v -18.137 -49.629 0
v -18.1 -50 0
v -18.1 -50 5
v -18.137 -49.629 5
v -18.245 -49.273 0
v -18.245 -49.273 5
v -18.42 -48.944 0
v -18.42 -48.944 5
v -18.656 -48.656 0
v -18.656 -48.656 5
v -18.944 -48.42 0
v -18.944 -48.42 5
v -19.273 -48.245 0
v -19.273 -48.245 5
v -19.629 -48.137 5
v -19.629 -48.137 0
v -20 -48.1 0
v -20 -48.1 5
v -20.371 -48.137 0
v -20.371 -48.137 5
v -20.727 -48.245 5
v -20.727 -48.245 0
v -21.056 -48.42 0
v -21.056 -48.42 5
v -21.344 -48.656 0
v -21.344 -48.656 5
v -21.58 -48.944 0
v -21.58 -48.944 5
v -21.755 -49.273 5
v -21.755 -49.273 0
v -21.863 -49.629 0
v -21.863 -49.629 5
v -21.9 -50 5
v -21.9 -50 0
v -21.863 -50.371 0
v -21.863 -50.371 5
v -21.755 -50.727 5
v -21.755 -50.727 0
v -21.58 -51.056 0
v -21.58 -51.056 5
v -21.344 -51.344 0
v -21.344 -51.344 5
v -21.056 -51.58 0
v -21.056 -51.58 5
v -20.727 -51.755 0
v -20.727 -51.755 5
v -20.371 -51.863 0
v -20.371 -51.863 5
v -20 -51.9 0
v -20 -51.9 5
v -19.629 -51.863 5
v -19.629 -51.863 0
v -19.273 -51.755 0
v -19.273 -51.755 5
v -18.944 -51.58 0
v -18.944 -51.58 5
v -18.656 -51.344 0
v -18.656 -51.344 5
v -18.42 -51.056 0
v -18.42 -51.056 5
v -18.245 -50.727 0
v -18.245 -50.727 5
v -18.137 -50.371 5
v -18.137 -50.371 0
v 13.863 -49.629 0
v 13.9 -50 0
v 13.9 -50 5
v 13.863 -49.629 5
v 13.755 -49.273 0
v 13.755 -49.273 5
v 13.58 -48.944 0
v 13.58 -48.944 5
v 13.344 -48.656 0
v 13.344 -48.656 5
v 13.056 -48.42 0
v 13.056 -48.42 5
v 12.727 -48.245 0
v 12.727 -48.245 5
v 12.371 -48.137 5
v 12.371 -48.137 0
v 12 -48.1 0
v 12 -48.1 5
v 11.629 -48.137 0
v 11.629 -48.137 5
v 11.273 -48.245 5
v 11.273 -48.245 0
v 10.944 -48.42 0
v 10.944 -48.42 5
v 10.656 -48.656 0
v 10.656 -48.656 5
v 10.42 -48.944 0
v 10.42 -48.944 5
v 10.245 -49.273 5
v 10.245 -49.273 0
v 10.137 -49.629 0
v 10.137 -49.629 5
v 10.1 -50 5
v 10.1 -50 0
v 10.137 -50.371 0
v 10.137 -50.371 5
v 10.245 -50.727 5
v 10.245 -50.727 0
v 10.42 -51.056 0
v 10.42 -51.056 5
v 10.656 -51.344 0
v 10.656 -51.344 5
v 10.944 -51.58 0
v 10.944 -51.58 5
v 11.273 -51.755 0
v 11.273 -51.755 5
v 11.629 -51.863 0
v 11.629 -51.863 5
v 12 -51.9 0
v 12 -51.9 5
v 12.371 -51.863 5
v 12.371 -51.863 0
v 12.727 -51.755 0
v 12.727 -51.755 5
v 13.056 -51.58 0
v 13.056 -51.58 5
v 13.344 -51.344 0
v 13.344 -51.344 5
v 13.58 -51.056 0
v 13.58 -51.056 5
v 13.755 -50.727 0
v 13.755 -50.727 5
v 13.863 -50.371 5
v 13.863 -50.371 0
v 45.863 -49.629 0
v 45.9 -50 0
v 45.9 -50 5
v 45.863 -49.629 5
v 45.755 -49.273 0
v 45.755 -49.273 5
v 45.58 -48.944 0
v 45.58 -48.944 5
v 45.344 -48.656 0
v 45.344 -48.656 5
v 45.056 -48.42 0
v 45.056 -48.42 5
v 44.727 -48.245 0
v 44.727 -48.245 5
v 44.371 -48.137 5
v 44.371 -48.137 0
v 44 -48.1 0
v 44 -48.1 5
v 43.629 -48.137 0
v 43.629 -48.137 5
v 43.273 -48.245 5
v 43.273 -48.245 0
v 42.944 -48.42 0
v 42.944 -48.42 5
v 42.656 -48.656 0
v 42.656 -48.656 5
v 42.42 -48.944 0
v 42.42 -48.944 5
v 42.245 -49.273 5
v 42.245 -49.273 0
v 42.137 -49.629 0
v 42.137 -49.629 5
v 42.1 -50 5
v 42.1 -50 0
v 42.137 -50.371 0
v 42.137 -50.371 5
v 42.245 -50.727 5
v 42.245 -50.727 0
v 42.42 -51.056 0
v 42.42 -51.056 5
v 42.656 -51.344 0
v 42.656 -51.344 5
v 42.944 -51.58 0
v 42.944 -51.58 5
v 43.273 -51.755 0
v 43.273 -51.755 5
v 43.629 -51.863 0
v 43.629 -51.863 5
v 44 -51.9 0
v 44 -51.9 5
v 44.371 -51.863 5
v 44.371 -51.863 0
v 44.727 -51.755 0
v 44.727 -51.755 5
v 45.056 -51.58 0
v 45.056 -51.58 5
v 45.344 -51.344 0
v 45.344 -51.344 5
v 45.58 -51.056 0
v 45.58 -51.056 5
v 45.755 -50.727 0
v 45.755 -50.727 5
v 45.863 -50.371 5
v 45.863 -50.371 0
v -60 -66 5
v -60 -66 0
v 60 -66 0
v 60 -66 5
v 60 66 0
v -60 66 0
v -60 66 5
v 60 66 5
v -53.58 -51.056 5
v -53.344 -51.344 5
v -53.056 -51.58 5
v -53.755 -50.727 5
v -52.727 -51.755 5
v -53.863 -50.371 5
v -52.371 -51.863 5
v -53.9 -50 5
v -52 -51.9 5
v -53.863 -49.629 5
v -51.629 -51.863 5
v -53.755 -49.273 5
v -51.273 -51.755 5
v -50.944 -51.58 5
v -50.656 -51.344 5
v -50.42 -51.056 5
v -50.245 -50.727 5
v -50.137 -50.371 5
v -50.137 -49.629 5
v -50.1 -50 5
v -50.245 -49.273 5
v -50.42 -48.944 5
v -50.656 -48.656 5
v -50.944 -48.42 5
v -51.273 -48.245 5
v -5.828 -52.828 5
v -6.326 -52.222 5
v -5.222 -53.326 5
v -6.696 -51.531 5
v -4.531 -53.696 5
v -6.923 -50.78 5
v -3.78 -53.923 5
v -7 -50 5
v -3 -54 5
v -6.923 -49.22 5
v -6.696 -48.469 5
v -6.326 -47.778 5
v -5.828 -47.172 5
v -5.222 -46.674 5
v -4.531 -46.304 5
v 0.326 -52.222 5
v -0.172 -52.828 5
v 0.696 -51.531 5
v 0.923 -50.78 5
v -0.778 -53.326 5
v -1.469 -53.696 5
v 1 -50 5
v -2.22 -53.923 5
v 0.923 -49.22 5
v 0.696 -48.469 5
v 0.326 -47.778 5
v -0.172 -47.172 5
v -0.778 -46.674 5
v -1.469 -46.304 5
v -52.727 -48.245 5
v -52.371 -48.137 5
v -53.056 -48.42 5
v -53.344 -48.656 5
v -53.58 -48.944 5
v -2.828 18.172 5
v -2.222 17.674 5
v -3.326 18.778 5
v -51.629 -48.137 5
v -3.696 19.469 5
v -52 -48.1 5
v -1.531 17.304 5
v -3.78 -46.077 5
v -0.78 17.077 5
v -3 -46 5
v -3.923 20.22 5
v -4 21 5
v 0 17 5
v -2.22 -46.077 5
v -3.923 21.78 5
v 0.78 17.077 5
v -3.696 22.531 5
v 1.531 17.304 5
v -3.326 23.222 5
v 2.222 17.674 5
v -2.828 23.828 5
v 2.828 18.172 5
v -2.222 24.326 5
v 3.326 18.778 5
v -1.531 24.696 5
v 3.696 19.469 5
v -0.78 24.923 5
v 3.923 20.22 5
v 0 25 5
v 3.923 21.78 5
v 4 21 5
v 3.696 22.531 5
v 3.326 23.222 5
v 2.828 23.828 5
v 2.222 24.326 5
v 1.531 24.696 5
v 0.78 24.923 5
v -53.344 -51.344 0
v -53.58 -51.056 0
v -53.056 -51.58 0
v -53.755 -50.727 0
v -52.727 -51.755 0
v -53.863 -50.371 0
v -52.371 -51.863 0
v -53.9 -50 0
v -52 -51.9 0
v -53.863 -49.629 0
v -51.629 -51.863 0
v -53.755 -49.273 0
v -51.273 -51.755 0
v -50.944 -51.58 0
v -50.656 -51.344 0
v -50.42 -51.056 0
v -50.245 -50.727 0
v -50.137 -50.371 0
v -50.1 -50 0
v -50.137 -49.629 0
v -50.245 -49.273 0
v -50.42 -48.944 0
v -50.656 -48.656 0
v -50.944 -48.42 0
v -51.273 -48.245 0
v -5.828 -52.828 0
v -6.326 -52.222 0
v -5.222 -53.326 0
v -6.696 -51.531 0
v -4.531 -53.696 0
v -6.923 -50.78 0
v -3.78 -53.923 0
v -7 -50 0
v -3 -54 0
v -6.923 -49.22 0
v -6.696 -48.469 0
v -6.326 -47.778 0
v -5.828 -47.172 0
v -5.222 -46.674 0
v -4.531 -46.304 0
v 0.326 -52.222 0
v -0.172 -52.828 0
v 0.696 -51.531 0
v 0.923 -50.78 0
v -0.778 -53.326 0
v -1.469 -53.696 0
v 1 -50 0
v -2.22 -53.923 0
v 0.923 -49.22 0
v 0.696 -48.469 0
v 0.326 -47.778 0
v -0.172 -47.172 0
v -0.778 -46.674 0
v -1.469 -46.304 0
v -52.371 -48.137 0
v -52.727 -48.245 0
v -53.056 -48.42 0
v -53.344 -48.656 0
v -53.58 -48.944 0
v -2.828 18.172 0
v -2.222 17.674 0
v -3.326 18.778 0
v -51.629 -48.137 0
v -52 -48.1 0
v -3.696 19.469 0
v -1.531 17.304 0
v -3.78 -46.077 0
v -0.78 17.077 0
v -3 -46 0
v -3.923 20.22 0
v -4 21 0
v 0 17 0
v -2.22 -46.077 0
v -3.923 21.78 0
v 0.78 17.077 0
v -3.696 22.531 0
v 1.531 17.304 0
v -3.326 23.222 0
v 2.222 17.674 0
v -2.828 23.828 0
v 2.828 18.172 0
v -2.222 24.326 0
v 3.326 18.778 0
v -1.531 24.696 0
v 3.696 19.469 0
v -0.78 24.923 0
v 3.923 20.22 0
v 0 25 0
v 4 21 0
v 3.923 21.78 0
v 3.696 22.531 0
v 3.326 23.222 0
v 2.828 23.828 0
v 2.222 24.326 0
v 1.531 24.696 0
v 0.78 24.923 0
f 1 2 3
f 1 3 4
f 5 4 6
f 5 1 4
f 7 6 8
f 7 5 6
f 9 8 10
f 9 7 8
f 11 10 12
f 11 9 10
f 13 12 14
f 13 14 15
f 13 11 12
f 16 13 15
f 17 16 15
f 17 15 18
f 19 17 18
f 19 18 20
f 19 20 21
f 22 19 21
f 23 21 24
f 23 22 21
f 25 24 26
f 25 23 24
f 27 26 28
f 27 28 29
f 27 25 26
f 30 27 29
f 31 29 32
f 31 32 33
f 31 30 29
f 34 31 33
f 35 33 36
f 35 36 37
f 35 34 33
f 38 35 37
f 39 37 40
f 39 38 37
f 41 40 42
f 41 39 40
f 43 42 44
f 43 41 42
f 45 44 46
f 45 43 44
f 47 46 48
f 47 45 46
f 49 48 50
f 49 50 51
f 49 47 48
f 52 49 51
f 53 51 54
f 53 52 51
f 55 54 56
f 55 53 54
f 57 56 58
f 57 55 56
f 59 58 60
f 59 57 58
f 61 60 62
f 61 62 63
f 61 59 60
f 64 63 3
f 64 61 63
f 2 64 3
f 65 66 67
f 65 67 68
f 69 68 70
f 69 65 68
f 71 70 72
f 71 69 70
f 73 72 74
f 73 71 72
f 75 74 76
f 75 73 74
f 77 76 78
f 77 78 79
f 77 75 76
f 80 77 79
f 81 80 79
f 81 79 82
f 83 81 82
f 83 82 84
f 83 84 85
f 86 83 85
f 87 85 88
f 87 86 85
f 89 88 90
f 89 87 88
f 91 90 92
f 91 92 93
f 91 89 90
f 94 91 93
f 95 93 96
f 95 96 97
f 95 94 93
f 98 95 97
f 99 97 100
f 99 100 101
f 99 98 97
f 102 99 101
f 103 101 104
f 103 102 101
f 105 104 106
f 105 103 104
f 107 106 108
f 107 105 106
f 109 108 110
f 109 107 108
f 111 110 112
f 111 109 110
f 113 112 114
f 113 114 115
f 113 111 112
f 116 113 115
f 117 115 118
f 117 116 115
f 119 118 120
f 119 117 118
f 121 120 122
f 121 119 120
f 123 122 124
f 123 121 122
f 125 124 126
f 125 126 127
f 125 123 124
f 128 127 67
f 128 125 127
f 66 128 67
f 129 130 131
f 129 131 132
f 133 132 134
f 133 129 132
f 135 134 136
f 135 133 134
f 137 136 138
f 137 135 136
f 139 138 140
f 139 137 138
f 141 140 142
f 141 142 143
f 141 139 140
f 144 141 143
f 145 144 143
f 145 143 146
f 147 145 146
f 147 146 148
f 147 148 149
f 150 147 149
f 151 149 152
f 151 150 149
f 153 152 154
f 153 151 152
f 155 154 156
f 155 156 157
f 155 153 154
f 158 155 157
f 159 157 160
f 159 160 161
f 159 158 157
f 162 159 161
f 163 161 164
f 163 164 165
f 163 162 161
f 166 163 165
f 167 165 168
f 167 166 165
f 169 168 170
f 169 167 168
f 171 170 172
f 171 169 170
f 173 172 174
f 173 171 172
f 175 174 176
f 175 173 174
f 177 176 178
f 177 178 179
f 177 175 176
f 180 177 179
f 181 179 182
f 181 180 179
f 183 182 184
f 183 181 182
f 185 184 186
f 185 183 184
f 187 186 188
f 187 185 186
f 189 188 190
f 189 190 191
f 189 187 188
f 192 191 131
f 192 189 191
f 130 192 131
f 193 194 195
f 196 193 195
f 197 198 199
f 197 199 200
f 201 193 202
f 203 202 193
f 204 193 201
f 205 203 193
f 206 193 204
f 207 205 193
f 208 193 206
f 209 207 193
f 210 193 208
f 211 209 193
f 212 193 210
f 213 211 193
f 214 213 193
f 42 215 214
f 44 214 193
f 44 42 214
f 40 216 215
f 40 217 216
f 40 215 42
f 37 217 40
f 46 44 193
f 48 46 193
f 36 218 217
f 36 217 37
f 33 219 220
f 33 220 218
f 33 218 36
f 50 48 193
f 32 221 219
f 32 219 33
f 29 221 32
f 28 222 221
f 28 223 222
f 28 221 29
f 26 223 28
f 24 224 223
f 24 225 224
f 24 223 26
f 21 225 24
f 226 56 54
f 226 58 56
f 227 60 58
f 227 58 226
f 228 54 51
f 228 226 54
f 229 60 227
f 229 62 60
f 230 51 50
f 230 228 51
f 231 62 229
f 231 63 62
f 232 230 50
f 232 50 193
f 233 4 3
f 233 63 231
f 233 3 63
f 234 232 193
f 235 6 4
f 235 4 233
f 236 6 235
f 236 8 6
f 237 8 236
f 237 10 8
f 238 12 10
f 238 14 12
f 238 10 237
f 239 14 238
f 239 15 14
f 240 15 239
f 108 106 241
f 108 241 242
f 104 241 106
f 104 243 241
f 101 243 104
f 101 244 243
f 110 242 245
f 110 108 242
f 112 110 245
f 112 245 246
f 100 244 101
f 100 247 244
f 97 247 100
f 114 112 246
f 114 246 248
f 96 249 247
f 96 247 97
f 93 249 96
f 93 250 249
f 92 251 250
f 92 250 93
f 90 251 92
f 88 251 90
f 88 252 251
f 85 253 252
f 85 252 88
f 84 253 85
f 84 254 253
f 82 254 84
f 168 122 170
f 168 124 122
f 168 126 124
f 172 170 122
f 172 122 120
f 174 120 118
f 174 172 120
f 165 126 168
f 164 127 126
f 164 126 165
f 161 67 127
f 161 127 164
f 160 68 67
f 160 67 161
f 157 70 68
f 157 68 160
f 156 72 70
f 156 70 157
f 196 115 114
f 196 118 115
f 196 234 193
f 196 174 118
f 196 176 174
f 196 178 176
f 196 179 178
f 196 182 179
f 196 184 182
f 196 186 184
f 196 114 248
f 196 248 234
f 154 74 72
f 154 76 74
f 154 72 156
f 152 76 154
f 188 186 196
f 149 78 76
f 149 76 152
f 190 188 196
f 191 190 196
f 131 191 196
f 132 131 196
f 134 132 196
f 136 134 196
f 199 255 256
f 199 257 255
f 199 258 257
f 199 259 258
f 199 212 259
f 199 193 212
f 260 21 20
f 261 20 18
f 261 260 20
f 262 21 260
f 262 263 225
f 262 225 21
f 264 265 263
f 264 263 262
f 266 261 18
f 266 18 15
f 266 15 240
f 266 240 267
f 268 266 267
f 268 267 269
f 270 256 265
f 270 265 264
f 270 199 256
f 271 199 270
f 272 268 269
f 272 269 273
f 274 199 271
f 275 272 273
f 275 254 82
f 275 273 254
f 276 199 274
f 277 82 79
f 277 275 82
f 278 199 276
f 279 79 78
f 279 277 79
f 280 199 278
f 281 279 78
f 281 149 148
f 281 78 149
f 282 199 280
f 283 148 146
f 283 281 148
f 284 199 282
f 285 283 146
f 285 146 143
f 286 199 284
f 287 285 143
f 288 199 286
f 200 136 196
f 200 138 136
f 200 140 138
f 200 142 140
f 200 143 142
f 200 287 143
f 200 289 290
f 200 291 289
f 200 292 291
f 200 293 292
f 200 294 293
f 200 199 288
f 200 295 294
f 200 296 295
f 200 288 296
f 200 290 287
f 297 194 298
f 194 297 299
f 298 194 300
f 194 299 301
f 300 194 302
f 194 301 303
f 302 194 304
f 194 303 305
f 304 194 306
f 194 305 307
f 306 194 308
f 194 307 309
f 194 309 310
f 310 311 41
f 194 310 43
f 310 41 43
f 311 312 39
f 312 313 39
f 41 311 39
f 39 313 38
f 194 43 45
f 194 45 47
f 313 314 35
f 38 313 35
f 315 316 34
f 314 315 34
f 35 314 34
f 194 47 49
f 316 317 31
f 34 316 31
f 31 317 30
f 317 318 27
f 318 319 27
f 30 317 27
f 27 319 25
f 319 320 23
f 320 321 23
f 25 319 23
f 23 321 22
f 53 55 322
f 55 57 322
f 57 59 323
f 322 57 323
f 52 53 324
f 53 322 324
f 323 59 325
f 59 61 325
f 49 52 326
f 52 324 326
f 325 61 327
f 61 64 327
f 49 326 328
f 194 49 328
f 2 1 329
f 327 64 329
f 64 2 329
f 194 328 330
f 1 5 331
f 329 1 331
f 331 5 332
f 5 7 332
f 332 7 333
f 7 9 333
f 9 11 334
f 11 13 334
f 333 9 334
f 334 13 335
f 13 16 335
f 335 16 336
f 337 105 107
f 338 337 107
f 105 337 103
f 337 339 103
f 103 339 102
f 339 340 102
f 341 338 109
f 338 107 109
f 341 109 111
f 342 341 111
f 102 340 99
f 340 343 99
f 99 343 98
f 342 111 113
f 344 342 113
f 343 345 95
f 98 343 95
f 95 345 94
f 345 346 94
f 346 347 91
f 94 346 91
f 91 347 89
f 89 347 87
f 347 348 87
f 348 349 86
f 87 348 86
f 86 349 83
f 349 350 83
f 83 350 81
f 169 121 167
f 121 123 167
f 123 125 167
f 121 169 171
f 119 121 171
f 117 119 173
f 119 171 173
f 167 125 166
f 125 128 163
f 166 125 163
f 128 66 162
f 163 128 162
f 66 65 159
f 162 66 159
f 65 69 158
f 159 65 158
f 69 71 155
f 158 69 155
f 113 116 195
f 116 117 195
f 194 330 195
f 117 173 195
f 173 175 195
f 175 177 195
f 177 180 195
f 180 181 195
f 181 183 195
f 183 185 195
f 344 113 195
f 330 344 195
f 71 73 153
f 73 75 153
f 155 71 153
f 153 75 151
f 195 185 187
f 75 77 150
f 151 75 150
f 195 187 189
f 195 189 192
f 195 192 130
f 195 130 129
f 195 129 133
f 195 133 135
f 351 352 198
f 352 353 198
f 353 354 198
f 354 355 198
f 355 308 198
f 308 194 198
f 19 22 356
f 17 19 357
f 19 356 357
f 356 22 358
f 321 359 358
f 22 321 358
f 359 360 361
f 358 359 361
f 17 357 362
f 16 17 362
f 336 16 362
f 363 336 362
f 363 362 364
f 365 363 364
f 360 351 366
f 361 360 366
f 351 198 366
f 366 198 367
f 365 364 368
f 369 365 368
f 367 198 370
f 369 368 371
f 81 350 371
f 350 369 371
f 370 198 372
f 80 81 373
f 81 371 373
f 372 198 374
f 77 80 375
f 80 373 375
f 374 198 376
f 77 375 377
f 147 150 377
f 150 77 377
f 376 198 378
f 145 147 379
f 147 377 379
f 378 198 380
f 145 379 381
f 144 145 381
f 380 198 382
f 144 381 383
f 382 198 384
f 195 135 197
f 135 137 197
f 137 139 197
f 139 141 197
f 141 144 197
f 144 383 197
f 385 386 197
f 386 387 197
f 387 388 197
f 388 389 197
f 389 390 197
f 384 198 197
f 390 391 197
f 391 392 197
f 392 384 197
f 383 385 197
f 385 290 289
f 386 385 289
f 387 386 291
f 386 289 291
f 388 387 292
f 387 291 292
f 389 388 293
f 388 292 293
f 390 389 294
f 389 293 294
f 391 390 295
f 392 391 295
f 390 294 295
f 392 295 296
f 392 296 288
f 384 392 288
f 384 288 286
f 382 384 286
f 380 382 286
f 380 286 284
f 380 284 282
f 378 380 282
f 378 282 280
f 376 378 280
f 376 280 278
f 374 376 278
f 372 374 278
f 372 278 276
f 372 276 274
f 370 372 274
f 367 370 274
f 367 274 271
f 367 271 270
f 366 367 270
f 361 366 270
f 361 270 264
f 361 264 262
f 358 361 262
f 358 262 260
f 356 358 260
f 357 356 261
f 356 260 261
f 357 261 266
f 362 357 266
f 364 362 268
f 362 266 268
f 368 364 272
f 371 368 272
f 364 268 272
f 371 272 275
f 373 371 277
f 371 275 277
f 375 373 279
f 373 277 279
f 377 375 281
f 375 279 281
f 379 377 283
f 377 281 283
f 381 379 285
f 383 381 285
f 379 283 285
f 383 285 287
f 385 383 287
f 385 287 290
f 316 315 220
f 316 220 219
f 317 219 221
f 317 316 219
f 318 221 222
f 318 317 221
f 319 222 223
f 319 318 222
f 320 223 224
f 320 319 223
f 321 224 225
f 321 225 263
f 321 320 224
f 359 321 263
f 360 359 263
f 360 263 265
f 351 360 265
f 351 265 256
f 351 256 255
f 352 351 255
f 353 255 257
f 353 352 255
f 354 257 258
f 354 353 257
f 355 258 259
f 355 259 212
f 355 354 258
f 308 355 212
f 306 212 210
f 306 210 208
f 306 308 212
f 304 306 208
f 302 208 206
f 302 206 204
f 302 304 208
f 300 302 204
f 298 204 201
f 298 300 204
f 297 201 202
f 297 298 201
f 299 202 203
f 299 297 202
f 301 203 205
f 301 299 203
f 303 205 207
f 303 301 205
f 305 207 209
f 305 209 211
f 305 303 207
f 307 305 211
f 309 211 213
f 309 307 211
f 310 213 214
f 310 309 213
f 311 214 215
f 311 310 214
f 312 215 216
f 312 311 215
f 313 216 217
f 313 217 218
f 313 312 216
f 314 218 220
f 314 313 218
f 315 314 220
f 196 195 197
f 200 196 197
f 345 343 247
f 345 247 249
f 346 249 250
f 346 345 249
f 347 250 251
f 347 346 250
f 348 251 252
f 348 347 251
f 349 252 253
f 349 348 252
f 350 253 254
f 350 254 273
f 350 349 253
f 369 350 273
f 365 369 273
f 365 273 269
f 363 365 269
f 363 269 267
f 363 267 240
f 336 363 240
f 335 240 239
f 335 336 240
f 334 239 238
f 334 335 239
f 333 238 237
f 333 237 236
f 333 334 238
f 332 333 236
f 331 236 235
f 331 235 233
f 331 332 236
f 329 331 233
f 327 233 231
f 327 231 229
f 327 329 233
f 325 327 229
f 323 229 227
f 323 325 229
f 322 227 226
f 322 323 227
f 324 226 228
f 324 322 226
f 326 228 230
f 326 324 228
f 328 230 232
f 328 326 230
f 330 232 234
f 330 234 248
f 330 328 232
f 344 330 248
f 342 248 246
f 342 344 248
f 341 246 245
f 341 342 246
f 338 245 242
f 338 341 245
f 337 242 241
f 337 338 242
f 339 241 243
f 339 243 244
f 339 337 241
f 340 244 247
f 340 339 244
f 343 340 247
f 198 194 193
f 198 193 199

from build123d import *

# Parameters (mm, degrees)
F0_W     = 120
F0_H     = 132
F0_R     = 1.9
F0_R_2   = 4
F1_DEPTH = 5
F2_R     = 4
F3_DEPTH = 25


# Not quite as in the source:
# - a feature names something its author has since deleted; it is built from what else it names


with BuildPart() as f1:
    # F0 (on Top) → F1 (new body)
    with BuildSketch(Plane.XY):
        Rectangle(F0_W, F0_H)
        with Locations((-52, -50)):
            Circle(F0_R, mode=Mode.SUBTRACT)
        with Locations((-20, -50)):
            Circle(F0_R, mode=Mode.SUBTRACT)
        with Locations((-3, -50)):
            Circle(F0_R_2, mode=Mode.SUBTRACT)
        with Locations((12, -50)):
            Circle(F0_R, mode=Mode.SUBTRACT)
        with Locations((44, -50)):
            Circle(F0_R, mode=Mode.SUBTRACT)
    extrude(amount=F1_DEPTH)

    # F2 (on face) → F3 (cut)
    with BuildSketch(Plane.XY.offset(5)):
        with Locations((0, 21)):
            Circle(F2_R)
    extrude(amount=-F3_DEPTH, mode=Mode.SUBTRACT)


solid = f1.part
